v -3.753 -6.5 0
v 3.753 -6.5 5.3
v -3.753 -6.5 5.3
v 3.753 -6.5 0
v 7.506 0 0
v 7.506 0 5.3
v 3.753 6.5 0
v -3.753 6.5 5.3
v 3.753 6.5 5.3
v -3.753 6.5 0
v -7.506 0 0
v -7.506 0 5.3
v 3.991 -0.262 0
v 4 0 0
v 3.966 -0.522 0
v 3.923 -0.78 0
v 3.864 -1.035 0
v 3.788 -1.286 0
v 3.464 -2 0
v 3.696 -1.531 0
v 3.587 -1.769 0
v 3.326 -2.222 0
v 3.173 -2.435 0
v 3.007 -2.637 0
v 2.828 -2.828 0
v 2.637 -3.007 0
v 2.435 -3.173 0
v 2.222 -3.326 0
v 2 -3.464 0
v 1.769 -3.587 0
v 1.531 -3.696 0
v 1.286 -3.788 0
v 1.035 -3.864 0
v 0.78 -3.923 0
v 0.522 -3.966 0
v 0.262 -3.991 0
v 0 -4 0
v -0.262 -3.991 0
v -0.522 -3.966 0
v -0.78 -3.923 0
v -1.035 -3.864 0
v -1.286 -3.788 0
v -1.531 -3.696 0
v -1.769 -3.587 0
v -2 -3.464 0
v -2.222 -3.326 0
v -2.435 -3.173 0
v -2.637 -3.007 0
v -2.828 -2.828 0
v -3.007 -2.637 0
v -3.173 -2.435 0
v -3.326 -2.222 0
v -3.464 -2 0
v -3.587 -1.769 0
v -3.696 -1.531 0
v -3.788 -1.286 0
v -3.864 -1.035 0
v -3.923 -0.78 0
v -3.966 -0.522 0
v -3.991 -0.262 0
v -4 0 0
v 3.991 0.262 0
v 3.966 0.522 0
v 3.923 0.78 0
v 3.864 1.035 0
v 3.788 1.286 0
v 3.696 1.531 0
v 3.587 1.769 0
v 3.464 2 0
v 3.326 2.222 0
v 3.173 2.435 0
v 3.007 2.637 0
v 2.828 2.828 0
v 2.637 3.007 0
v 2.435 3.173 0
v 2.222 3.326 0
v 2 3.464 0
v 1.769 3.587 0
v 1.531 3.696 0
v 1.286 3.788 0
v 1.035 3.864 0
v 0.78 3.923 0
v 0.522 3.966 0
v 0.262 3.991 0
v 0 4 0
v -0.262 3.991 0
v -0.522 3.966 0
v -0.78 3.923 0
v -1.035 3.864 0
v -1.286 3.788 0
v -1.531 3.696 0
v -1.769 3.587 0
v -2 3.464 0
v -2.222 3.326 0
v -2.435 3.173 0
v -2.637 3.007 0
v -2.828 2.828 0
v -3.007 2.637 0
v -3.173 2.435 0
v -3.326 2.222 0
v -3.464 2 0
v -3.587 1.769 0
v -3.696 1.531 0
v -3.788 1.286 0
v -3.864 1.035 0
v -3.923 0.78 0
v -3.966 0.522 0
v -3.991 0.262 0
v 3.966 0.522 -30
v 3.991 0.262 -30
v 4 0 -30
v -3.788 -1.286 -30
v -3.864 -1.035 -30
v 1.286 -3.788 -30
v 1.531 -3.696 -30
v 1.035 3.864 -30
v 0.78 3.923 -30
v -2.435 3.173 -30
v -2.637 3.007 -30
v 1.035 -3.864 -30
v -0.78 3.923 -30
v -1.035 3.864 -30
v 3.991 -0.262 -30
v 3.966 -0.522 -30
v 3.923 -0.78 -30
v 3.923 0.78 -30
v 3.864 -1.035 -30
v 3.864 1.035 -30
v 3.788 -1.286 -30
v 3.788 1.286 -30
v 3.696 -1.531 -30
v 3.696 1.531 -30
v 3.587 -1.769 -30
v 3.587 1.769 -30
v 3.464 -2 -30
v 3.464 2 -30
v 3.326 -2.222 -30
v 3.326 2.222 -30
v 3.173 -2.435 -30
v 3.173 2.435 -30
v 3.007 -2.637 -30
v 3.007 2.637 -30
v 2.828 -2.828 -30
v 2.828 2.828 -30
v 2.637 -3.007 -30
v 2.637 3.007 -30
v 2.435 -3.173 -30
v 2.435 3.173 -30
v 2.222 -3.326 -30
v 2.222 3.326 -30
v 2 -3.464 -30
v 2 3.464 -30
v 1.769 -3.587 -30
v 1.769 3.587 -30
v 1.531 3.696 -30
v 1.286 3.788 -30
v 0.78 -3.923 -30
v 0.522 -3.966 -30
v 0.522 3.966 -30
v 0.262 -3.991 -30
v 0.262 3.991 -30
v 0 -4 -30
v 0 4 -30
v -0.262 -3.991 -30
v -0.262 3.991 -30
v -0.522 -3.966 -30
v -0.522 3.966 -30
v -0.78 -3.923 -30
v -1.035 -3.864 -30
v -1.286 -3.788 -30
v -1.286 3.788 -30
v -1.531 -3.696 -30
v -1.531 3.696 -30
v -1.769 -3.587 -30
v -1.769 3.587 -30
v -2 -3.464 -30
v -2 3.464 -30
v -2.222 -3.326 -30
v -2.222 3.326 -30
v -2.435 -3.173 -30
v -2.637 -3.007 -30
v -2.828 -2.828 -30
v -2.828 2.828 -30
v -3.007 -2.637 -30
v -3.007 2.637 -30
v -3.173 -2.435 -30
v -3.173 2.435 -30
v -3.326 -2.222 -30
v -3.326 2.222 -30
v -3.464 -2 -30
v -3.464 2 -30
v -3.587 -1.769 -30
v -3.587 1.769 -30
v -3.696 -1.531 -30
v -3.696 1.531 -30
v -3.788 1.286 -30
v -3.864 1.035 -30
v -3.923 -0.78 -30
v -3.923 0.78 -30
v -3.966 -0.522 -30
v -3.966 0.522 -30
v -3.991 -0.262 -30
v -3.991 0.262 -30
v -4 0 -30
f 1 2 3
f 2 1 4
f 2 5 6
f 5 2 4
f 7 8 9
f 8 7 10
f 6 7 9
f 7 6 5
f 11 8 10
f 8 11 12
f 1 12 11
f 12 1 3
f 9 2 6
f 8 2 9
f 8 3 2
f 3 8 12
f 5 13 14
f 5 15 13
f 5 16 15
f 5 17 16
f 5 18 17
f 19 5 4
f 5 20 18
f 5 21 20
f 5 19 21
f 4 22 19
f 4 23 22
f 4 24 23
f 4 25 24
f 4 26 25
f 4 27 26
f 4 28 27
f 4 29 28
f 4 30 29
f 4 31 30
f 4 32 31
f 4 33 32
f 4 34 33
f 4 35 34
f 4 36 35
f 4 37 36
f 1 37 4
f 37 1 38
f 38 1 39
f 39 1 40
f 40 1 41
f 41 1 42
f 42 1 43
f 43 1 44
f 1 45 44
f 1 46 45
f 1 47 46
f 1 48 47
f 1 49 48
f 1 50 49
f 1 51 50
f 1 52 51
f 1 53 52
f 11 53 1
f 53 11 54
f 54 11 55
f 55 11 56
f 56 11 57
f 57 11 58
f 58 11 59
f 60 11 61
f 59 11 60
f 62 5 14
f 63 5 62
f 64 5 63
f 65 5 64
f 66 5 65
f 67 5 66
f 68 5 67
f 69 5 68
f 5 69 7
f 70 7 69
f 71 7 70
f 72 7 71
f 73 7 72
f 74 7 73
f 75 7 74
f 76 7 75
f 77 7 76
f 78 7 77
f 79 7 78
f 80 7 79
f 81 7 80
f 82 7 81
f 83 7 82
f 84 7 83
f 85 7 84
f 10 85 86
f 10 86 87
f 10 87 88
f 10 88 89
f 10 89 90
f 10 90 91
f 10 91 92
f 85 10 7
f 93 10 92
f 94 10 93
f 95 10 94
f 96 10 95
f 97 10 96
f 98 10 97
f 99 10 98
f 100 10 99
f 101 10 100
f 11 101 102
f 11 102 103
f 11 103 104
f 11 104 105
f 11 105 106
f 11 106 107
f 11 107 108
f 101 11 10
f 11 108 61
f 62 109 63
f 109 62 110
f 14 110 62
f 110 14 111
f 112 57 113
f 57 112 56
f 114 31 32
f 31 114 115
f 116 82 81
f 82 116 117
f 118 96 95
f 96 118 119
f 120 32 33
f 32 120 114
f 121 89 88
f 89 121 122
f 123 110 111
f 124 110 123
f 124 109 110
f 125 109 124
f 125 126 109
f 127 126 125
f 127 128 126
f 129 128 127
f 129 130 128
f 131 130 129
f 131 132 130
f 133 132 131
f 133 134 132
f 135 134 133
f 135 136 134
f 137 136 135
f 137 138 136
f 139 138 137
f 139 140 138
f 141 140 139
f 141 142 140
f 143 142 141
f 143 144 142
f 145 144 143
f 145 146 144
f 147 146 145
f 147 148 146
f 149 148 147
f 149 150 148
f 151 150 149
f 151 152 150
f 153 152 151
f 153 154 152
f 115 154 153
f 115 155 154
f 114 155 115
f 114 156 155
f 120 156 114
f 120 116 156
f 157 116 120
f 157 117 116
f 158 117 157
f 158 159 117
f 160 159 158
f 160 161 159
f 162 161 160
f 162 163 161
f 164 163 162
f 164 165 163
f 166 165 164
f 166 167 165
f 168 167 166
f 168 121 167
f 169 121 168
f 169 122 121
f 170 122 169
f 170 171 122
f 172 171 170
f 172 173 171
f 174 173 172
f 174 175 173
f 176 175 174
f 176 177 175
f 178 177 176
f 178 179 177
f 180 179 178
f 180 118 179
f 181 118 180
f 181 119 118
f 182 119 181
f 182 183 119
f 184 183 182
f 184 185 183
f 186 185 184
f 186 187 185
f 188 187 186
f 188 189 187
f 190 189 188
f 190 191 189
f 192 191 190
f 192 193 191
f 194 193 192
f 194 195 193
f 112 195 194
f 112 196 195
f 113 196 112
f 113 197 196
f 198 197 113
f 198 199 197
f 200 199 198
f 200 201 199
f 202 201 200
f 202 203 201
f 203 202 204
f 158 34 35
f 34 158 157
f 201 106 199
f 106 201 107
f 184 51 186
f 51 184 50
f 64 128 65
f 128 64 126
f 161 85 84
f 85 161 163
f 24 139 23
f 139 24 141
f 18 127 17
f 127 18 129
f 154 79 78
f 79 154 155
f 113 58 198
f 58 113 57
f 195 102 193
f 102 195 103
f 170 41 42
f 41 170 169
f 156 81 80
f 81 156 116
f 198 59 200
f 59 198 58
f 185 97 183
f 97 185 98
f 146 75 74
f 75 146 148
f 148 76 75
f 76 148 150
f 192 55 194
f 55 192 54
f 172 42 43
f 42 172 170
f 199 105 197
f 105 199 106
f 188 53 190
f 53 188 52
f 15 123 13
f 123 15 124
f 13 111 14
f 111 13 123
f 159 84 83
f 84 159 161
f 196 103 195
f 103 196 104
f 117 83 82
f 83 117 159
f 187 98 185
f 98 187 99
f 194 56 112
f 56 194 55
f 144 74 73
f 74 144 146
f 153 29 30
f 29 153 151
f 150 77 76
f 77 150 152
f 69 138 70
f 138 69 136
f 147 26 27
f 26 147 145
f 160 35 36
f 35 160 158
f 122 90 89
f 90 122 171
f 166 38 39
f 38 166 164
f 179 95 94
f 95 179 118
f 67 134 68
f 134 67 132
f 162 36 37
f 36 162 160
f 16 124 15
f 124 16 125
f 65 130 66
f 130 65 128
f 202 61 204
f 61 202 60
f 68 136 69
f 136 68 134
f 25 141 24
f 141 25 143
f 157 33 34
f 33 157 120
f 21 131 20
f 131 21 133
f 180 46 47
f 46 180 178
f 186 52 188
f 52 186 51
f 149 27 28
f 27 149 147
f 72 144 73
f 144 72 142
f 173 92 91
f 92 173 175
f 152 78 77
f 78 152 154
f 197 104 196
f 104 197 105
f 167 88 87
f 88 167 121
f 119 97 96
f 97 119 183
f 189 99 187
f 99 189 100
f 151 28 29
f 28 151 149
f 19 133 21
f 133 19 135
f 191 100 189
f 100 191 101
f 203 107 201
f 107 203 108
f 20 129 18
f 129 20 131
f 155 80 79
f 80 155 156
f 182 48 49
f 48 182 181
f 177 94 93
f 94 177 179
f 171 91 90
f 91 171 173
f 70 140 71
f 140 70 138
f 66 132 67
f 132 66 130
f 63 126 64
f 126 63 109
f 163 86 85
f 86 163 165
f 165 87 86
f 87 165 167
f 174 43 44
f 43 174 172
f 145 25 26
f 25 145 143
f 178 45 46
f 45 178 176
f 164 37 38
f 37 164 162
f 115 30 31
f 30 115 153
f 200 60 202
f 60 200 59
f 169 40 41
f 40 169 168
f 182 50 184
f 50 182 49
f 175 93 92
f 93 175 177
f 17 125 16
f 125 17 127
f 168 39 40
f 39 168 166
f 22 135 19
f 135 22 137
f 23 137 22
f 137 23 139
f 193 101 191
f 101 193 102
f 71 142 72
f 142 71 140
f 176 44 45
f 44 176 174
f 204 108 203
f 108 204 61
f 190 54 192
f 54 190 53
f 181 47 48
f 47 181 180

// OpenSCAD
// Parameters
af = 13;           // across-flats for hex head (mm)
head_h = 5.3;      // head height (mm)
shank_d = 8;       // shank diameter (mm)
shank_len = 30;    // shank length (mm)

// Derived
head_r = af / sqrt(3);  // circumradius for hex to achieve given across-flats

// Hex head (base at z=0, extends to +Z)
module hex_head(h, r) {
    cylinder(h=h, r=r, $fn=6);
}

// Shank (extends from z=0 down to -Z)
module shank(len, d) {
    translate([0,0,-len])
        cylinder(h=len, r=d/2, $fn=96);
}

// Assemble
union() {
    hex_head(head_h, head_r);
    shank(shank_len, shank_d);
}
